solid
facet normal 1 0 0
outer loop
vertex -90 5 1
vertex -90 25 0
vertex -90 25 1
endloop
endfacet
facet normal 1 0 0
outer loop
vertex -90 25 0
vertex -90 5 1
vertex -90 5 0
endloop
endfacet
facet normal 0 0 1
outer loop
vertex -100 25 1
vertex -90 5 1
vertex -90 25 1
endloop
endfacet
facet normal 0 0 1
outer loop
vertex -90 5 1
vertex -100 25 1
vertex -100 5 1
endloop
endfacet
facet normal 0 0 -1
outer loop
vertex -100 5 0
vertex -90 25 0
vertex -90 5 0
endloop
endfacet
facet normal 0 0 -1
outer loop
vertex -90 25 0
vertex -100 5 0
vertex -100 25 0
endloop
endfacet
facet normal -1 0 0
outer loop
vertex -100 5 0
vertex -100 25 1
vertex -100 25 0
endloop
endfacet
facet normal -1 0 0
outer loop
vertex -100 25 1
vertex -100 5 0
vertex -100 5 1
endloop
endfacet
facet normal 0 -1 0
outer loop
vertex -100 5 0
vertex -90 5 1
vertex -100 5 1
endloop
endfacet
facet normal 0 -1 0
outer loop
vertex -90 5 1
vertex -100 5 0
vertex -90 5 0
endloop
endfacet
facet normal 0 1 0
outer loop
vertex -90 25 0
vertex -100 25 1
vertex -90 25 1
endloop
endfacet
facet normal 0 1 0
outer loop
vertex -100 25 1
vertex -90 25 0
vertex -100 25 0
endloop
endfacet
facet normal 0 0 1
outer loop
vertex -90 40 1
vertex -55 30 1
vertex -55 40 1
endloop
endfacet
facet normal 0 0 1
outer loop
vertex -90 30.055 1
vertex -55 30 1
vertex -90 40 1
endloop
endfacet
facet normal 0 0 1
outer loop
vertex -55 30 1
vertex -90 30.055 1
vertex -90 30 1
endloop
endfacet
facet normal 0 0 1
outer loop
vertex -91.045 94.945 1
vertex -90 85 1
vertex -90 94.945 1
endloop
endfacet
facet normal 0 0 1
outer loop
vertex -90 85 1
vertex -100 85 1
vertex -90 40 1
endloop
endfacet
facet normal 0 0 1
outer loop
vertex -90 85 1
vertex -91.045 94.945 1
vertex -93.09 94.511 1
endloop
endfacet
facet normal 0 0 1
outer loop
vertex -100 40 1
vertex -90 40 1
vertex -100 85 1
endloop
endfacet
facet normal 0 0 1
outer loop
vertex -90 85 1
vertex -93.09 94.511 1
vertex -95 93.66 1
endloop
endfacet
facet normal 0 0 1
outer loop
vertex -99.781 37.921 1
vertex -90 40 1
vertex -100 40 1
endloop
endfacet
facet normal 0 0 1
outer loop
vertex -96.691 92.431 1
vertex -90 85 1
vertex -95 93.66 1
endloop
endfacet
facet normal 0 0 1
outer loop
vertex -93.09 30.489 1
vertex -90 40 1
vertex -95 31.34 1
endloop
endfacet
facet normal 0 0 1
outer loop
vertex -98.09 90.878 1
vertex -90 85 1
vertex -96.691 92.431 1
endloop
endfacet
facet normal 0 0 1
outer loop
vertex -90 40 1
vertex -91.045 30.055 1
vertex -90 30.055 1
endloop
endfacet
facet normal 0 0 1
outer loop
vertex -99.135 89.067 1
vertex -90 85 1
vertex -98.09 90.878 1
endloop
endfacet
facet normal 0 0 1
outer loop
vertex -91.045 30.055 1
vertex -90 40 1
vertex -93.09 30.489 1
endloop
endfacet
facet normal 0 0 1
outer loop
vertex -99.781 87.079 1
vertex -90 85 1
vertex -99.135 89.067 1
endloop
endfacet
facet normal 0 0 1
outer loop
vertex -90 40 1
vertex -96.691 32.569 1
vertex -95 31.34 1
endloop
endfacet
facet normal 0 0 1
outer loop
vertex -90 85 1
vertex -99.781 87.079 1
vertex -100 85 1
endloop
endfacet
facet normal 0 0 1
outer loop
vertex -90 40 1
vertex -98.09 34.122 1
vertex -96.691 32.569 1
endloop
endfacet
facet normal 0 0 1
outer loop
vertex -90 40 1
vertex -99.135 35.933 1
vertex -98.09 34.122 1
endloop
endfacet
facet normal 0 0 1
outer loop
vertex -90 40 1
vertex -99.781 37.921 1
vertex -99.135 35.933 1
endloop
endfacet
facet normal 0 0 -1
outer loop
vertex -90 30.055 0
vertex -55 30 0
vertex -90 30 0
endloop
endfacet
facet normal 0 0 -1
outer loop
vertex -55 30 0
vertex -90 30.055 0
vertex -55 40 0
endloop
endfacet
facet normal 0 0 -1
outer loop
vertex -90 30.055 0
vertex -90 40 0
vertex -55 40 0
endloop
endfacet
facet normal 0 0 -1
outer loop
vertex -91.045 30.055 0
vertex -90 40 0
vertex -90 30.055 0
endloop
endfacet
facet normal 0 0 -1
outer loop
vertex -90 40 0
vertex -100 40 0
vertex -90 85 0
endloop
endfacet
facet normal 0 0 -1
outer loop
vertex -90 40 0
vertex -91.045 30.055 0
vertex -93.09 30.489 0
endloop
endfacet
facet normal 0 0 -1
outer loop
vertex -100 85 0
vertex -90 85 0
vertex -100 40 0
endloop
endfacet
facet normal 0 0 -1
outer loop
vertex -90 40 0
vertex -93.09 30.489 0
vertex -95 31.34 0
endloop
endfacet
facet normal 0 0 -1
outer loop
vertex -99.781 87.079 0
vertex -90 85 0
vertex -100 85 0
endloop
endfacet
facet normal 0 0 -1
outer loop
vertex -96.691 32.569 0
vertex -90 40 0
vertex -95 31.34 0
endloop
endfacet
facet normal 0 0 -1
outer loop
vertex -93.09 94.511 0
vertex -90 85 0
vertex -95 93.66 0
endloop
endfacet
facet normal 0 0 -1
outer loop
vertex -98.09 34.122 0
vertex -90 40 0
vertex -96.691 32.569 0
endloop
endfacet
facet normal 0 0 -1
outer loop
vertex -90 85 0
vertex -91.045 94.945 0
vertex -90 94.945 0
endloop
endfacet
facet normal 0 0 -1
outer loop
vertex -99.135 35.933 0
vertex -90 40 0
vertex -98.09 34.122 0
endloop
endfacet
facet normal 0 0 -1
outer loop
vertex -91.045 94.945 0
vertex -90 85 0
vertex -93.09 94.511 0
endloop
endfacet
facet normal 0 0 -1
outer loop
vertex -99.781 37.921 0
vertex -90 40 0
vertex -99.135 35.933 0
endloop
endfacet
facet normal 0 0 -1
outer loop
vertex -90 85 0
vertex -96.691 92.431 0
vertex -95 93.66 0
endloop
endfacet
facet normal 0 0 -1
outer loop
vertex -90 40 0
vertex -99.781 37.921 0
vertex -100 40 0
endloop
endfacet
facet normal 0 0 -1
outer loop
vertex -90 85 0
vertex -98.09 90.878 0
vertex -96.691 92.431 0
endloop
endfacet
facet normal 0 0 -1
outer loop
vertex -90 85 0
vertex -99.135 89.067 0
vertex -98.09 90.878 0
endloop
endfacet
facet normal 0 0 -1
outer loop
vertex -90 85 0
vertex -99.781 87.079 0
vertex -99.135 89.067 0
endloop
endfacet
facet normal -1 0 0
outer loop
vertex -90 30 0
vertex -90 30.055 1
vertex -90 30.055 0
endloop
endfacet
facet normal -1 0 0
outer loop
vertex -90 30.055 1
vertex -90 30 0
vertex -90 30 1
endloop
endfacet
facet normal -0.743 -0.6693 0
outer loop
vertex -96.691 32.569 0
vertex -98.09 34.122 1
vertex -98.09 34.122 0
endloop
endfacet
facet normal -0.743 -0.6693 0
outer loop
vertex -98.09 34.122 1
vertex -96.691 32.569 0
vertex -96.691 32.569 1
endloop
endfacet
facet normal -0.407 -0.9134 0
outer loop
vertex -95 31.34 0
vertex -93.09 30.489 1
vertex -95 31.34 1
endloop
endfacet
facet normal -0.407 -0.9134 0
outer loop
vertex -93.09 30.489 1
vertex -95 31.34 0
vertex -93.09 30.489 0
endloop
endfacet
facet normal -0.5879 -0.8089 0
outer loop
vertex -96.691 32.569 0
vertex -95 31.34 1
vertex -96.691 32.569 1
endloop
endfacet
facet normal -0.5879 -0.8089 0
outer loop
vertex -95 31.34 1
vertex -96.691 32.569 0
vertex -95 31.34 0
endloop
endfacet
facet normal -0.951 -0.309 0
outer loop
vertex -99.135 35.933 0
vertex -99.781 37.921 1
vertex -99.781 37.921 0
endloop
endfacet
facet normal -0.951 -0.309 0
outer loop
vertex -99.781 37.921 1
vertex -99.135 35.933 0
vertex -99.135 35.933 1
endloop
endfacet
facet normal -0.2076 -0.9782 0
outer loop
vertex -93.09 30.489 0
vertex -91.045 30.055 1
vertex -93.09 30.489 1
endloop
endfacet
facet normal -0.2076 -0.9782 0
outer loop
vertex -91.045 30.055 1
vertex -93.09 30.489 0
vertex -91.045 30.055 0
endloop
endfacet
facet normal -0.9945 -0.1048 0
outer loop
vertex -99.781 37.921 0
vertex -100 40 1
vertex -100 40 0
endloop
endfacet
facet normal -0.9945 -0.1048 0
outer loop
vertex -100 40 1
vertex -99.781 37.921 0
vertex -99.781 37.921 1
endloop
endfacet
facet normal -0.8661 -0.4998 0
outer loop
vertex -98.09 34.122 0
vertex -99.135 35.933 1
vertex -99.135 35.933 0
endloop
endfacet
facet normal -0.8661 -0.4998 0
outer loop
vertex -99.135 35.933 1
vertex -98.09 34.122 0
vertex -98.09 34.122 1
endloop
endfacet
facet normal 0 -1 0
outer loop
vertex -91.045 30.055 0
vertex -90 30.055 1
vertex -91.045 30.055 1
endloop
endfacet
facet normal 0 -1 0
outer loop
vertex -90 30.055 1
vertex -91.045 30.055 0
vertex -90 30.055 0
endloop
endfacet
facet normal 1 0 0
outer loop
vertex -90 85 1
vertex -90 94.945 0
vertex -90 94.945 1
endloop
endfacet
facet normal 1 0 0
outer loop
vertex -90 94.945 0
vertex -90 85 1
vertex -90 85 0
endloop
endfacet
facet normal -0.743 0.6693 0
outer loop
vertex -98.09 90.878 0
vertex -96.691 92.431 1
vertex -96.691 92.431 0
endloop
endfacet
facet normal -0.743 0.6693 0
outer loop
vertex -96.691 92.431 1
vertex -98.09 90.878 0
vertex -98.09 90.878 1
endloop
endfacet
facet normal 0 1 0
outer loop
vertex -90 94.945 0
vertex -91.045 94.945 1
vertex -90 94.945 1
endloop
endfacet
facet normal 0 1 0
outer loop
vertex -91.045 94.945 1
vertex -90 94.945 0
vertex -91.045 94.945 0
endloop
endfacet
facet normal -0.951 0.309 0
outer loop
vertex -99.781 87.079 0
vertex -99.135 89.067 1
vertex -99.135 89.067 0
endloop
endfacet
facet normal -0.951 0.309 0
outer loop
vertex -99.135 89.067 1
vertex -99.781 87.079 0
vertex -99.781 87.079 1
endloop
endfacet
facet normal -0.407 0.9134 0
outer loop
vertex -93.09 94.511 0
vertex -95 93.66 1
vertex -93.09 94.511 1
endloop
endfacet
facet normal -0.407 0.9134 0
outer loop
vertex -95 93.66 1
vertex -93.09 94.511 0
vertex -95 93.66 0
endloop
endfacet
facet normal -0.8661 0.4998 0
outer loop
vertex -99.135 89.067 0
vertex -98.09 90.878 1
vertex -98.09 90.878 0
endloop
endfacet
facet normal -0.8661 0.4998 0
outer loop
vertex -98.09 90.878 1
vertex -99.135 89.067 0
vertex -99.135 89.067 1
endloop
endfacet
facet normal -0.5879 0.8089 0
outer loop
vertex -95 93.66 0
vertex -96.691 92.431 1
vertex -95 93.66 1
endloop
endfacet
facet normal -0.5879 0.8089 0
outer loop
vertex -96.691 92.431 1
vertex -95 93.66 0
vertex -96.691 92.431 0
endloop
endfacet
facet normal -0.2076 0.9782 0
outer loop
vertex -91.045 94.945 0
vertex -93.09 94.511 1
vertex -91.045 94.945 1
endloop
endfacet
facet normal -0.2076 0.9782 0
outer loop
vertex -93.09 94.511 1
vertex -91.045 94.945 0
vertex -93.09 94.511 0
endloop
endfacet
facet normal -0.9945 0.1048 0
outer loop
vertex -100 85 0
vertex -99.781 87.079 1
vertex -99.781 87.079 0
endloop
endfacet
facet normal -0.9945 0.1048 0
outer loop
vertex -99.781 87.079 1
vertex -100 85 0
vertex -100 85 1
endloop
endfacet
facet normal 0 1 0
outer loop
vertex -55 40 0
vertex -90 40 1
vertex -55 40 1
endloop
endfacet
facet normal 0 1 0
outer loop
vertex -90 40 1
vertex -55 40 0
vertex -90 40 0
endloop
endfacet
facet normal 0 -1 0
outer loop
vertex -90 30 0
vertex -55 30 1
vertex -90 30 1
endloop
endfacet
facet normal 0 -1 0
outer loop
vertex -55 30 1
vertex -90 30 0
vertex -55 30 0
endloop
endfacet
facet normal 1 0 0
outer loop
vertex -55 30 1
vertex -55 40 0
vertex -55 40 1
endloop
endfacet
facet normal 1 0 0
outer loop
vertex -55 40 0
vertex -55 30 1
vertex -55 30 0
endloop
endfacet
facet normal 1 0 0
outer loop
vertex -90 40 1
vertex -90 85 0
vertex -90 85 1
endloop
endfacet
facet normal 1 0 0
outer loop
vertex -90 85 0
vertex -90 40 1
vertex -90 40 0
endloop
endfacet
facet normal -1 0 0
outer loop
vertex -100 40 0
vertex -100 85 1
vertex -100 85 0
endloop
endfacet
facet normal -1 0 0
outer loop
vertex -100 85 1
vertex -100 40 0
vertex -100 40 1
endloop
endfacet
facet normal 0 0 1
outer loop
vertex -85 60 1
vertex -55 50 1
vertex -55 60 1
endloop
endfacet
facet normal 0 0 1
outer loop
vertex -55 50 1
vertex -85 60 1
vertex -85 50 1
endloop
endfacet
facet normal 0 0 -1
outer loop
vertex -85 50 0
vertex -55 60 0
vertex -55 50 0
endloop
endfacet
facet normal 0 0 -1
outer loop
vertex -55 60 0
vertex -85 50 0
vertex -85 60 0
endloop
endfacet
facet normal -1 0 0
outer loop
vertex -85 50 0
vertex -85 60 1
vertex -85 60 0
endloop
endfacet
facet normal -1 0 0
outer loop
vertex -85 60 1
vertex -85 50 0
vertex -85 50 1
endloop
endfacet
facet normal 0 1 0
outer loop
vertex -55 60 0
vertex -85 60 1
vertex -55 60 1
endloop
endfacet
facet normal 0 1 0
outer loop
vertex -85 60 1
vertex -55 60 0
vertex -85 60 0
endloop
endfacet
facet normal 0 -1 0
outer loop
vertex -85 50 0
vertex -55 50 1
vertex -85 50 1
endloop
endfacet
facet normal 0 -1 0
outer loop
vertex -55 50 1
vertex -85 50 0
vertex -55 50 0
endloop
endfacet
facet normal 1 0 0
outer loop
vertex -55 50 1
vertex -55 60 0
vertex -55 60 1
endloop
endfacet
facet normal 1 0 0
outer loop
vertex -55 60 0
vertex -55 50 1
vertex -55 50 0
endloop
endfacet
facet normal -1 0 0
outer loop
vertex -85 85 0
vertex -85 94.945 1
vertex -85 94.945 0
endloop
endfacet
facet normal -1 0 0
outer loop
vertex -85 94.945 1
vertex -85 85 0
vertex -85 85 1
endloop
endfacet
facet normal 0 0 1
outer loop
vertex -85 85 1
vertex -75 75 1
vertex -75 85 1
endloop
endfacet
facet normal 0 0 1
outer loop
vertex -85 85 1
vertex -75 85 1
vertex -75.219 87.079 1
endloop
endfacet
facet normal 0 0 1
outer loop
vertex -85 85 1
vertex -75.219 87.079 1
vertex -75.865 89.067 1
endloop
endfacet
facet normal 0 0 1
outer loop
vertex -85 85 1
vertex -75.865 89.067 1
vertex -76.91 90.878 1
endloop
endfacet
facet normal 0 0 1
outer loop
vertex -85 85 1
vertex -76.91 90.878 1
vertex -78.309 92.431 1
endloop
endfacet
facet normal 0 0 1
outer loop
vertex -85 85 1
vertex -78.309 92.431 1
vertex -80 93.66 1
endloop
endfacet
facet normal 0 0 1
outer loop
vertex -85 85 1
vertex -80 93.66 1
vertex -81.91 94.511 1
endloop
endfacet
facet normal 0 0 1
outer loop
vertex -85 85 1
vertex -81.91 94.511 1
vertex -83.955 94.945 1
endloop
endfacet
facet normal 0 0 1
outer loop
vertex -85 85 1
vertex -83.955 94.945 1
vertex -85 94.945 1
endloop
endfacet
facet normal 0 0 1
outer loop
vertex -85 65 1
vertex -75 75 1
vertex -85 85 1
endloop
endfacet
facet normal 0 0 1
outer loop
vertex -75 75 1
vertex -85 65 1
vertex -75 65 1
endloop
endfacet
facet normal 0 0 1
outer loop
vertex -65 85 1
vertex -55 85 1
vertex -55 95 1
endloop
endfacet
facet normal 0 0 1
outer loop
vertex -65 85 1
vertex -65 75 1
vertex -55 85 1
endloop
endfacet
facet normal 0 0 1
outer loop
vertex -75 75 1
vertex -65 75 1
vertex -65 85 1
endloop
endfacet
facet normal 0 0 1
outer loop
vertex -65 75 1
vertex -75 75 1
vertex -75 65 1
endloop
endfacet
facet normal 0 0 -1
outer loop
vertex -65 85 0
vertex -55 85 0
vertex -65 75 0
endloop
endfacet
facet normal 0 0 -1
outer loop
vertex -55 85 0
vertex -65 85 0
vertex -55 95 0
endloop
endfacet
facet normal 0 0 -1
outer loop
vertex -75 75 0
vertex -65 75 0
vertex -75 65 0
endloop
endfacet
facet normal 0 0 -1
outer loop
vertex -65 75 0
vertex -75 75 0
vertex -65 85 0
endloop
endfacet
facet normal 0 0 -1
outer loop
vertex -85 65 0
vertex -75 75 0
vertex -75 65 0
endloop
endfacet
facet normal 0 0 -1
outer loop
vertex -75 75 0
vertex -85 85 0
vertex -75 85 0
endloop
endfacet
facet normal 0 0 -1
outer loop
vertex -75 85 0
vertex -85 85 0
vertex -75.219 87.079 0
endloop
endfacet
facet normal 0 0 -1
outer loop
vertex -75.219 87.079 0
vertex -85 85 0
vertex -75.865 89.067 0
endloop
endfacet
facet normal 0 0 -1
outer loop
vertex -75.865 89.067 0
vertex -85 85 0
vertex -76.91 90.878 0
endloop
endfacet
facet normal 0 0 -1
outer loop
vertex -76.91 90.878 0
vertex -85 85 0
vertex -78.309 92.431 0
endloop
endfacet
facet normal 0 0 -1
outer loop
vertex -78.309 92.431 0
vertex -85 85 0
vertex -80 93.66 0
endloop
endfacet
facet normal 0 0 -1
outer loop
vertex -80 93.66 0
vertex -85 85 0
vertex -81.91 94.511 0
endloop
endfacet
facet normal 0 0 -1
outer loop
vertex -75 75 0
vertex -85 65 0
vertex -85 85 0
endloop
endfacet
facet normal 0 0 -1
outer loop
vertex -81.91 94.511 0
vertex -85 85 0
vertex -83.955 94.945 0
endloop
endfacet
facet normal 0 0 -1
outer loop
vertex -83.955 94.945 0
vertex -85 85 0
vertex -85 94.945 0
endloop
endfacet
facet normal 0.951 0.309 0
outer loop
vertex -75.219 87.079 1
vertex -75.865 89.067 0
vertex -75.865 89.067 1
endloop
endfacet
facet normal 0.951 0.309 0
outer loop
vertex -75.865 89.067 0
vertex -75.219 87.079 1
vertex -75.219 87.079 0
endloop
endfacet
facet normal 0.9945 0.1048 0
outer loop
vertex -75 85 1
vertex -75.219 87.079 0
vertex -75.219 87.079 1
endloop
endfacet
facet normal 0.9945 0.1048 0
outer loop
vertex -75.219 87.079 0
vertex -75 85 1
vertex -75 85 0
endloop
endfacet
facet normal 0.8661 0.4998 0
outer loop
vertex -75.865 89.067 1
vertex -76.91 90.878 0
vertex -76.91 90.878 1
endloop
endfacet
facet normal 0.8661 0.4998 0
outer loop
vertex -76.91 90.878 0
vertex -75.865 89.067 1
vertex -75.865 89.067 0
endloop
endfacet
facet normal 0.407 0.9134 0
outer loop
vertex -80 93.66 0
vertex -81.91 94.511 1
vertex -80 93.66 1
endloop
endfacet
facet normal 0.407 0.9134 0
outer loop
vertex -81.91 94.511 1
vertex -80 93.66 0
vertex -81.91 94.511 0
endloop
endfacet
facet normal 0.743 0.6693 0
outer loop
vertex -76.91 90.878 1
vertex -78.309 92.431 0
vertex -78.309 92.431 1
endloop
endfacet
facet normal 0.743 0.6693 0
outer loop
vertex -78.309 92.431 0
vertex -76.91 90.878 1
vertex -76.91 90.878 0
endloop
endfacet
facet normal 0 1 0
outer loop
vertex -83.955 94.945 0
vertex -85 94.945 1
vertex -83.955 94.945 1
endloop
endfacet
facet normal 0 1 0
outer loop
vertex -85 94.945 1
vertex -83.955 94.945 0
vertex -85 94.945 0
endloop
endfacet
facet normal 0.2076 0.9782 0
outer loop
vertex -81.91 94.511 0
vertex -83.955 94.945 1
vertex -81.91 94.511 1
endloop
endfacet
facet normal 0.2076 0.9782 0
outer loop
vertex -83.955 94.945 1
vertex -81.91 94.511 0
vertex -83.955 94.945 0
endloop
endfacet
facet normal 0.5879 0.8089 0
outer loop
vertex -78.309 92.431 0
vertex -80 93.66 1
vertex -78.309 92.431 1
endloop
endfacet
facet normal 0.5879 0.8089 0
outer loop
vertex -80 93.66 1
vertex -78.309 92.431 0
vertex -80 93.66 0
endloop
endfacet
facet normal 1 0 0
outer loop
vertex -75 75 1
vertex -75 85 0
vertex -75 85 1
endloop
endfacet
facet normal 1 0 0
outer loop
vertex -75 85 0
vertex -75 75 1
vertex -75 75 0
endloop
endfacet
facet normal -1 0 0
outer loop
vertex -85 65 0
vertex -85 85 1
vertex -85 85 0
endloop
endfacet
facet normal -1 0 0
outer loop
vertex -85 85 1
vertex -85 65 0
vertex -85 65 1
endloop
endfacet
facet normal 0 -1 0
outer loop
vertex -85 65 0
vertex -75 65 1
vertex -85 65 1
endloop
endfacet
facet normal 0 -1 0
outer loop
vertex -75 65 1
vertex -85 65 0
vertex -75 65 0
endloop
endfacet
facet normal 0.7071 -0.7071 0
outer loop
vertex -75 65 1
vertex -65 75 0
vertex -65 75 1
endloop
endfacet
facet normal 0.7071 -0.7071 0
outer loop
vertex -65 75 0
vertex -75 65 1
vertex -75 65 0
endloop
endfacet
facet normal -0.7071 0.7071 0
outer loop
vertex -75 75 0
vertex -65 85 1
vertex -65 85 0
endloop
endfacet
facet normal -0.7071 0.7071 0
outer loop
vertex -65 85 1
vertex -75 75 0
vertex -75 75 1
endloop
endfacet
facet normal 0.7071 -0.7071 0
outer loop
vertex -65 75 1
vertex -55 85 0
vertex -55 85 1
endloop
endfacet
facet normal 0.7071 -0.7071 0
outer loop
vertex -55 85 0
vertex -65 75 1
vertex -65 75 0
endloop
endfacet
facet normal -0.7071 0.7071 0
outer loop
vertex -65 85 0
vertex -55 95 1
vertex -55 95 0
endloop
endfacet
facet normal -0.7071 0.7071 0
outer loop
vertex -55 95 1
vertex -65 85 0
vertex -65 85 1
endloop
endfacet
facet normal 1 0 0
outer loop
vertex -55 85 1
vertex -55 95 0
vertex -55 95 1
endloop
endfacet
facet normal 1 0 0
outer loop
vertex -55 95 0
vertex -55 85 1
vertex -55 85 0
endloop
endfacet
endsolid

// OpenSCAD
//Tron-Trout
// Created by Juan Angueyra (angueyra@gmail.com
// May 2015

// Variables
unit=10;
unit_z=unit/10;

n_faces=16;


// main call
3Dprintflag=0;
t1_tr = 3Dprintflag ? [0,0,0] : [-10*unit,0,0];
t1_rot = 3Dprintflag ? [0,0,0] : [0,0,0];
translate(t1_tr){rotate(t1_rot){t1();}}

t2_tr = 3Dprintflag ? [0,0,0] : [-10*unit,3*unit,0];
t2_rot = 3Dprintflag ? [0,0,0] : [0,0,0];
translate(t2_tr){rotate(t2_rot){t2();}}

r1_tr = 3Dprintflag ? [0,0,0] : [-10*unit,5*unit,0];
r1_rot = 3Dprintflag ? [0,0,0] : [0,0,0];
translate(r1_tr){rotate(r1_rot){r1();}}

r2_tr = 3Dprintflag ? [0,0,0] : [-10*unit,6*unit,0];
r2_rot = 3Dprintflag ? [0,0,0] : [0,0,0];
translate(r2_tr){rotate(r2_rot){r2();}}

r3_tr = 3Dprintflag ? [0,0,0] : [-7.5*unit,6.5*unit,0];
r3_rot = 3Dprintflag ? [0,0,0] : [0,0,0];
translate(r3_tr){rotate(r3_rot){r3();}}

module r3() {
	pgram(0,0);
	pgram(1,1);
}

module r2() {
	square(1.5,0.5);
	square(1.5,1.5);
	q_circle(1,1.5,2.5);
}


module r1() {
	square(1.5,0);
	square(2,0);
	square(3,0);
	square(3.5,0);
}

module t2() {
	square(1,0);
	square(2,0);
	square(3,0);
	square(3.5,0);
	q_circle(3,1,1);
	square(0,1);
	square(0,2);
	square(0,3);
	square(0,4);
	square(0,4.5);
	q_circle(2,1,5.5);
}

module t1() {
	square(0,0.5);
	square(0,1.5);
}


	
//modules

module pgram(trx,try) {
	translate([unit*trx, unit*try, 0]) {pgram_base();}
	
}

module pgram_base(){
	difference() {
		square(0,0);
	
		translate([0, -sqrt(2)*unit, 0]) {rotate([0, 0, 45]) {
			union(){
				square(1,0);
				square(2,0);
			}
		}}
	}
	translate([unit,2*unit,0]) {
		rotate([180, 180, 0]) {
				difference() {
					square(0,0);
	
					translate([0, -sqrt(2)*unit, 0]) {rotate([0, 0, 45]) {
						union(){
							square(1,0);
							square(2,0);
						}
					}}
				}
			}
	}
	
}


module square(trx,try) {
	translate([unit*trx, unit*try, 0]) {cube(size=[unit, unit, unit_z], center=false);}
	
}

module q_circle(quarter,trx,try){
	if (quarter==1) {
		translate([unit*trx, unit*try, 0]) {
			difference() {
				cylinder(r=unit, h=unit_z, center=false);
				union() {
					// translate([0, 0, 0]) {square();}
					translate([-unit, 0, 0]) {square();}
					translate([-unit, -unit, 0]) {square();}
					translate([0, -unit, 0]) {square();}
				}
			}
		}
	}
	if (quarter==2) {
		translate([unit*trx, unit*try, 0]) {
			difference() {
				cylinder(r=unit, h=unit_z, center=false);
				union() {
					translate([0, 0, 0]) {square();}
					// translate([-unit, 0, 0]) {square();}
					translate([-unit, -unit, 0]) {square();}
					translate([0, -unit, 0]) {square();}
				}
			}
		}
	}
	if (quarter==3) {
		translate([unit*trx, unit*try, 0]) {
			difference() {
				cylinder(r=unit, h=unit_z, center=false);
				union() {
					translate([0, 0, 0]) {square();}
					translate([-unit, 0, 0]) {square();}
					// translate([-unit, -unit, 0]) {square();}
					translate([0, -unit, 0]) {square();}
				}
			}
		}
	}
	if (quarter==4) {
		translate([unit*trx, unit*try, 0]) {
			difference() {
				cylinder(r=unit, h=unit_z, center=false);
				union() {
					translate([0, 0, 0]) {square();}
					translate([-unit, 0, 0]) {square();}
					translate([-unit, -unit, 0]) {square();}
					// translate([0, -unit, 0]) {square();}
				}
			}
		}
	}
}

//Other .scad files
// use </Users/angueyraaristjm/Documents/3DProjects/ScrewsAndNuts/ScrewsAndNuts.scad>
